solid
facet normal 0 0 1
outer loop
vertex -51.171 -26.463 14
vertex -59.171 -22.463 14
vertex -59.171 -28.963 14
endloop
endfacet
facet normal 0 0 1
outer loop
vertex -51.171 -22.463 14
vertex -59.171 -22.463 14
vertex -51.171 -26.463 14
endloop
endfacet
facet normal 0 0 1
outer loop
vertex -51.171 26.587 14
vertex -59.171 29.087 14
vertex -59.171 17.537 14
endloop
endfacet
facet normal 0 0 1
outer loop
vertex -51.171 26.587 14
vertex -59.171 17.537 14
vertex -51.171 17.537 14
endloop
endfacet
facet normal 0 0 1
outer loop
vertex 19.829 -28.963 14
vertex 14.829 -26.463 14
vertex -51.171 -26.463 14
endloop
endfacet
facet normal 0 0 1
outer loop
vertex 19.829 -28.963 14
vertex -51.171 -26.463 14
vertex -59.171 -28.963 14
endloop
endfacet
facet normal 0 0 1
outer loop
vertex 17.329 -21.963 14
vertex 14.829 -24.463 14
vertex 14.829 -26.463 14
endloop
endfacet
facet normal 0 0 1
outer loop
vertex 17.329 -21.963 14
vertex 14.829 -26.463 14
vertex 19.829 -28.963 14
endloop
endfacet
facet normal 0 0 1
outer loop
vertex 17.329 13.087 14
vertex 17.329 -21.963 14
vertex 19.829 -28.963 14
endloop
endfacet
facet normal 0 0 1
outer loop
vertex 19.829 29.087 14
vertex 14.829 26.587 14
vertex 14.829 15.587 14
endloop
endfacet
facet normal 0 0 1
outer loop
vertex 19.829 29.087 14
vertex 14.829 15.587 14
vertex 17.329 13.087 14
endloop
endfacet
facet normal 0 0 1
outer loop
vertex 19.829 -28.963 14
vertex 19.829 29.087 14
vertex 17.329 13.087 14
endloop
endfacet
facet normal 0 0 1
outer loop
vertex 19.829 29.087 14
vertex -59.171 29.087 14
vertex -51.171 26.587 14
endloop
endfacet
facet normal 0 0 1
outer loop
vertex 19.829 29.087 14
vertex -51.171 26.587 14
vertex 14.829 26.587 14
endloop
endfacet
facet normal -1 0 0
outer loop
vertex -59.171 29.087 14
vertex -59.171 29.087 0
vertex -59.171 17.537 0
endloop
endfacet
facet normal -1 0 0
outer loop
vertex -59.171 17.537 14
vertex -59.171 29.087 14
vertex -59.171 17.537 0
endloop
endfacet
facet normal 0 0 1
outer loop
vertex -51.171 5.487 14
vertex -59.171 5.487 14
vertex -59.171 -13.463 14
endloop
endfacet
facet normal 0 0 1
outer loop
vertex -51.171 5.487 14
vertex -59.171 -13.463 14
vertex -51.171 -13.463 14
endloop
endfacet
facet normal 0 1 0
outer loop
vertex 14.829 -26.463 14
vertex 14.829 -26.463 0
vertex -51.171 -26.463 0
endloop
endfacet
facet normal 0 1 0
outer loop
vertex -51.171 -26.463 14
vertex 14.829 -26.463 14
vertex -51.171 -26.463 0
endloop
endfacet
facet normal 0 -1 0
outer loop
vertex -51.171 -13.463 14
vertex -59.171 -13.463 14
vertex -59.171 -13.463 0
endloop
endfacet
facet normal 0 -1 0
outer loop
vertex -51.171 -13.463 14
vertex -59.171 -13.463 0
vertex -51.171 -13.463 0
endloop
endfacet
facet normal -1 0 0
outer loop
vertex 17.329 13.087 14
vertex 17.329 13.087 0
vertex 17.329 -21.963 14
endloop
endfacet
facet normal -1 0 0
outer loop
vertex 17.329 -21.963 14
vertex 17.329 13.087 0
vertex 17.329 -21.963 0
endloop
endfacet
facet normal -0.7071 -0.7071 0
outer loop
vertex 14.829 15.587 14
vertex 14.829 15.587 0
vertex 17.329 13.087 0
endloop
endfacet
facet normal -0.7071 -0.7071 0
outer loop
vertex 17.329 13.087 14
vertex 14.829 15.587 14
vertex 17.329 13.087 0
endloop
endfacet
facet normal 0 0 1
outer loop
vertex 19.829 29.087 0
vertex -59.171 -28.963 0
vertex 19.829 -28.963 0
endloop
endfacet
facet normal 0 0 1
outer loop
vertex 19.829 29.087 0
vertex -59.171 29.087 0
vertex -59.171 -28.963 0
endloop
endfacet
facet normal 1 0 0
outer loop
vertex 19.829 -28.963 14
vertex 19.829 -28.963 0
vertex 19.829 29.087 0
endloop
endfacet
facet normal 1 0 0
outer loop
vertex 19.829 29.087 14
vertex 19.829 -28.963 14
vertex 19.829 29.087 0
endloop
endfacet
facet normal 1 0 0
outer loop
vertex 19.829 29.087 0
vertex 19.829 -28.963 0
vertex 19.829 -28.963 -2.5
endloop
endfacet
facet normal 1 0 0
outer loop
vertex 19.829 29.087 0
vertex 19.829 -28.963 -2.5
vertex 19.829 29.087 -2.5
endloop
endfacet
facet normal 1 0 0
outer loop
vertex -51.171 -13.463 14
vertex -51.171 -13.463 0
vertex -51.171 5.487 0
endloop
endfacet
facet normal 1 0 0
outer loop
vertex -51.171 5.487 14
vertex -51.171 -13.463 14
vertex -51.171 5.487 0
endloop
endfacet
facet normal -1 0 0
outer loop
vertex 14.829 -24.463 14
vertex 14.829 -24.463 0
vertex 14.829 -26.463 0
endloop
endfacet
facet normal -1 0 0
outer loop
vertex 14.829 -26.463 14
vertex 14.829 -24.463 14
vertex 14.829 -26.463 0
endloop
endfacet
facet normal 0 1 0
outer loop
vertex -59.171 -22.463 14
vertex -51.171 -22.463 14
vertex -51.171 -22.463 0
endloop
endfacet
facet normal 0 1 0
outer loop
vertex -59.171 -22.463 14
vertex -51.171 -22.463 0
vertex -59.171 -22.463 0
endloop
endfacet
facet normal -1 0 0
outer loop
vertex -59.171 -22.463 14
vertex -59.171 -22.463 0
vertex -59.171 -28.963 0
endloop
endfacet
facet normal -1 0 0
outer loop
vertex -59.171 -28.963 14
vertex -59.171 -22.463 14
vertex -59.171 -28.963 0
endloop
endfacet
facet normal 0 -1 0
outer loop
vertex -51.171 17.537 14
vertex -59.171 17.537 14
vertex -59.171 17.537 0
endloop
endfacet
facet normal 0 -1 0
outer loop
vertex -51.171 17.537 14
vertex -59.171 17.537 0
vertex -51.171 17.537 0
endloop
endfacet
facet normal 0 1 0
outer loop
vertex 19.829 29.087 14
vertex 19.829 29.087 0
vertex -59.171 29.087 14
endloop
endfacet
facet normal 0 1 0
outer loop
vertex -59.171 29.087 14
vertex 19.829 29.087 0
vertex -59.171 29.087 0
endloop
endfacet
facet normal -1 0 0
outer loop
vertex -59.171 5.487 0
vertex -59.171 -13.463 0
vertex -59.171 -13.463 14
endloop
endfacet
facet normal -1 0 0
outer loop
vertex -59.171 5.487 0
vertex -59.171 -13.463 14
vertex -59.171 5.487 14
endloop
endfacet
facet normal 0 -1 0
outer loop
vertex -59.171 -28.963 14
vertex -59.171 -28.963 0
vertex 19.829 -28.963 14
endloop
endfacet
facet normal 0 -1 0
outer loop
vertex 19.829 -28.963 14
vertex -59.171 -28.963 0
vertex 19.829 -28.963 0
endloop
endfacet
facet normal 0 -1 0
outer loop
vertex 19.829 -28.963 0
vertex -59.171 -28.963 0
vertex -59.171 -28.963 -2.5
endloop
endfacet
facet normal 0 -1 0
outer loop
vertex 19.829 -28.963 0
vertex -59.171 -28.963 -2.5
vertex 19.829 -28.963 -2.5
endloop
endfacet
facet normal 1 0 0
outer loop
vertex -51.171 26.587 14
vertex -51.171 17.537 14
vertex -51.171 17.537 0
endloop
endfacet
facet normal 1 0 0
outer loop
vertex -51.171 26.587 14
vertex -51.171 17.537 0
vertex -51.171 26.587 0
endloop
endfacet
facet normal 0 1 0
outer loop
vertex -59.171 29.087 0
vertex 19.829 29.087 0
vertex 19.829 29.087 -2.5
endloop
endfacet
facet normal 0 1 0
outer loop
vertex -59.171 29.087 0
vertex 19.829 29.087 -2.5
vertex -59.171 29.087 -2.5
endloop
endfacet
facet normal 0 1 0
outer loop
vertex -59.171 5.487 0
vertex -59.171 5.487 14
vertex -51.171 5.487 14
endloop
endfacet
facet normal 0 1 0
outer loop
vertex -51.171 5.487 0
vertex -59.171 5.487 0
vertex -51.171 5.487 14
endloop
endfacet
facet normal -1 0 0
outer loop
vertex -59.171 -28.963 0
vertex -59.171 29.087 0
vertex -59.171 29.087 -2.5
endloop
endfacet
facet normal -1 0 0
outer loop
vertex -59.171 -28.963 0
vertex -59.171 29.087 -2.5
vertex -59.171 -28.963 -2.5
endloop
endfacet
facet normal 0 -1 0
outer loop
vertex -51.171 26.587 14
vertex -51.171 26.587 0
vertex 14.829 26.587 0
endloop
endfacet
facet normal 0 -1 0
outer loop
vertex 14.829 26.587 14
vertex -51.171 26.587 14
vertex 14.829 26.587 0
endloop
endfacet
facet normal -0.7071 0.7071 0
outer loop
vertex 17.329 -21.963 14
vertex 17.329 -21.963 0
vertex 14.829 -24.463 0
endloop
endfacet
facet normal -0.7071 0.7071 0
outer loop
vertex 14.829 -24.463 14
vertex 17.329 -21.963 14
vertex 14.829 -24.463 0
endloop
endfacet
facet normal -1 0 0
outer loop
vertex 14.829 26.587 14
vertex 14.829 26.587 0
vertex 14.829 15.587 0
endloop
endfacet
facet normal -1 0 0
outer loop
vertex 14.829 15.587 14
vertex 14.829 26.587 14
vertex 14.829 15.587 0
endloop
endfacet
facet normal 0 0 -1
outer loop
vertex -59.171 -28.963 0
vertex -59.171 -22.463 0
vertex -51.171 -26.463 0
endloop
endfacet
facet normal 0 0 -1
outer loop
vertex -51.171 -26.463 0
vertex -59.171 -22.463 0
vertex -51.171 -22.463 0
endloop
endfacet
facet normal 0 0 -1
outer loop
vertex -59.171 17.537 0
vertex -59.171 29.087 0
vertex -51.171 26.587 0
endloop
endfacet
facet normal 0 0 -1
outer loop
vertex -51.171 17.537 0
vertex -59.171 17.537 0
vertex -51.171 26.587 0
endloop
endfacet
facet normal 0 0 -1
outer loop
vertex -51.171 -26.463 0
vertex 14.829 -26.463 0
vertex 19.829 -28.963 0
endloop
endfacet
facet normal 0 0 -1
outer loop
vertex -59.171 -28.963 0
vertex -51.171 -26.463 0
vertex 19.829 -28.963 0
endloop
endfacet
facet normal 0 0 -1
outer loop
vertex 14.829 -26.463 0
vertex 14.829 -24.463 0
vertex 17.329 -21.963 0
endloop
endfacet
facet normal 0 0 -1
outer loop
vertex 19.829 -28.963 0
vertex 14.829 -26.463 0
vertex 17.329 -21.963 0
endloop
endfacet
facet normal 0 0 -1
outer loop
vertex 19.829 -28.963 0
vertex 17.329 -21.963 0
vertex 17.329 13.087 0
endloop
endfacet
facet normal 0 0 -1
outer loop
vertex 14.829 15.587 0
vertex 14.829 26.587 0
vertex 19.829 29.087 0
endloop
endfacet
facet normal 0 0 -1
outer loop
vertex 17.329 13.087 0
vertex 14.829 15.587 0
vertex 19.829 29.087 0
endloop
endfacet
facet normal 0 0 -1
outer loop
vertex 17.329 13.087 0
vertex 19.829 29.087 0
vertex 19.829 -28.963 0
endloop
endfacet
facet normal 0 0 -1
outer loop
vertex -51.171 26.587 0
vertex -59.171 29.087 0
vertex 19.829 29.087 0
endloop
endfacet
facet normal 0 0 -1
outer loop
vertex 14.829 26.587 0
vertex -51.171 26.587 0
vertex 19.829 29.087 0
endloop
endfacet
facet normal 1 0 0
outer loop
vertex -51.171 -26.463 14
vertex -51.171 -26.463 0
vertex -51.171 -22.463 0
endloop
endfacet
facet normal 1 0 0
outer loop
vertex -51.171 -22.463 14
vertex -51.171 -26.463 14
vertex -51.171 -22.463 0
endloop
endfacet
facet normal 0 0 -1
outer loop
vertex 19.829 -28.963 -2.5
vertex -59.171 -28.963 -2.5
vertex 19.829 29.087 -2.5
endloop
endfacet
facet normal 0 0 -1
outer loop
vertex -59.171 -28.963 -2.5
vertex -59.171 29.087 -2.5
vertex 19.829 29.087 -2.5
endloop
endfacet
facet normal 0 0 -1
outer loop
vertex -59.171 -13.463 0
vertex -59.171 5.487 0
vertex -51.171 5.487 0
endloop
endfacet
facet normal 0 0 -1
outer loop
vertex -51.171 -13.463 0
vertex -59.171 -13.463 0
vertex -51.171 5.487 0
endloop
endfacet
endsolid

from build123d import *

# Parameters (mm, degrees)
F1_DEPTH = 14
F0_W     = 8
F0_H     = 18.95
F0_H_2   = 9
F0_H_3   = 12.05
F2_DEPTH = 2.5


with BuildPart() as f1:
    # F0 (on Top) → F1 (new body)
    with BuildSketch(Plane.XY):
        Polygon((-51.1712852555, 17.5374228269), (-51.1712852555, 26.5874228269), (14.8287147445, 26.5874228269), (17.3287147445, 26.5874228269), (17.3287147445, 13.0874228269), (17.3287147445, -21.9625771731), (17.3287147445, -26.4625771731), (14.8287147445, -26.4625771731), (-51.1712852555, -26.4625771731), (-51.1712852555, -22.4625771731), (-59.1712852555, -22.4625771731), (-59.1712852555, -28.9625771731), (19.8287147445, -28.9625771731), (19.8287147445, 29.0874228269), (-59.1712852555, 29.0874228269), (-59.1712852555, 17.5374228269), align=None)
        Polygon((17.3287147445, 26.5874228269), (14.8287147445, 26.5874228269), (14.8287147445, 15.5874228269), (17.3287147445, 13.0874228269), align=None)
        Polygon((17.3287147445, -21.9625771731), (14.8287147445, -24.4625771731), (14.8287147445, -26.4625771731), (17.3287147445, -26.4625771731), align=None)
    extrude(amount=F1_DEPTH)


with BuildPart() as f1b:
    # F0 (on Top) → F1, piece 2 (new body)
    with BuildSketch(Plane.XY):
        with Locations((-55.1712852555, -3.9875771731)):
            Rectangle(F0_W, F0_H)
    extrude(amount=F1_DEPTH)


with BuildPart() as f2:
    # F0 (on Top) → F2 (new body)
    with BuildSketch(Plane.XY):
        with BuildLine():
            Line((14.8287147445, 26.5874228269), (-51.1712852555, 26.5874228269))
            Line((-51.1712852555, 26.5874228269), (-51.1712852555, 17.5374228269))
            ThreePointArc((-51.1712852555, 17.5374228269), (-48.6712852555, 20.0374228269), (-46.1712852555, 17.5374228269))
            ThreePointArc((-46.1712852555, 17.5374228269), (-46.9035183025, 15.7696558739), (-48.6712852555, 15.0374228269))
            Line((-48.6712852555, 15.0374228269), (-48.6712852555, 7.9874228269))
            ThreePointArc((-48.6712852555, 7.9874228269), (-46.9035183025, 7.2551897799), (-46.1712852555, 5.4874228269))
            ThreePointArc((-46.1712852555, 5.4874228269), (-48.6712852555, 2.9874228269), (-51.1712852555, 5.4874228269))
            Line((-51.1712852555, 5.4874228269), (-51.1712852555, -13.4625771731))
            Line((-51.1712852555, -13.4625771731), (-51.1712852555, -22.4625771731))
            Line((-51.1712852555, -22.4625771731), (-51.1712852555, -26.4625771731))
            Line((-51.1712852555, -26.4625771731), (14.8287147445, -26.4625771731))
            Line((14.8287147445, -26.4625771731), (14.8287147445, -24.4625771731))
            Line((14.8287147445, -24.4625771731), (14.8287147445, 15.5874228269))
            Line((14.8287147445, 15.5874228269), (14.8287147445, 26.5874228269))
        make_face()
        with Locations((-55.1712852555, -17.9625771731)):
            Rectangle(F0_W, F0_H_2)
        Polygon((-51.1712852555, 17.5374228269), (-51.1712852555, 26.5874228269), (14.8287147445, 26.5874228269), (17.3287147445, 26.5874228269), (17.3287147445, 13.0874228269), (17.3287147445, -21.9625771731), (17.3287147445, -26.4625771731), (14.8287147445, -26.4625771731), (-51.1712852555, -26.4625771731), (-51.1712852555, -22.4625771731), (-59.1712852555, -22.4625771731), (-59.1712852555, -28.9625771731), (19.8287147445, -28.9625771731), (19.8287147445, 29.0874228269), (-59.1712852555, 29.0874228269), (-59.1712852555, 17.5374228269), align=None)
        with Locations((-55.1712852555, -3.9875771731)):
            Rectangle(F0_W, F0_H)
        with Locations((-55.1712852555, 11.5124228269)):
            Rectangle(F0_W, F0_H_3)
        Polygon((17.3287147445, 13.0874228269), (14.8287147445, 15.5874228269), (14.8287147445, -24.4625771731), (17.3287147445, -21.9625771731), align=None)
        Polygon((17.3287147445, -21.9625771731), (14.8287147445, -24.4625771731), (14.8287147445, -26.4625771731), (17.3287147445, -26.4625771731), align=None)
        Polygon((17.3287147445, 26.5874228269), (14.8287147445, 26.5874228269), (14.8287147445, 15.5874228269), (17.3287147445, 13.0874228269), align=None)
        with BuildLine():
            ThreePointArc((-46.1712852555, 17.5374228269), (-48.6712852555, 20.0374228269), (-51.1712852555, 17.5374228269))
            Line((-51.1712852555, 17.5374228269), (-48.6712852555, 17.5374228269))
            Line((-48.6712852555, 17.5374228269), (-48.6712852555, 15.0374228269))
            ThreePointArc((-48.6712852555, 15.0374228269), (-46.9035183025, 15.7696558739), (-46.1712852555, 17.5374228269))
        make_face()
        with BuildLine():
            Line((-48.6712852555, 17.5374228269), (-51.1712852555, 17.5374228269))
            ThreePointArc((-51.1712852555, 17.5374228269), (-50.4390522084, 15.7696558739), (-48.6712852555, 15.0374228269))
            Line((-48.6712852555, 15.0374228269), (-48.6712852555, 17.5374228269))
        make_face()
        with BuildLine():
            ThreePointArc((-48.6712852555, 15.0374228269), (-50.4390522084, 15.7696558739), (-51.1712852555, 17.5374228269))
            Line((-51.1712852555, 17.5374228269), (-51.1712852555, 5.4874228269))
            ThreePointArc((-51.1712852555, 5.4874228269), (-50.4390522084, 7.2551897799), (-48.6712852555, 7.9874228269))
            Line((-48.6712852555, 7.9874228269), (-48.6712852555, 15.0374228269))
        make_face()
        with BuildLine():
            ThreePointArc((-48.6712852555, 7.9874228269), (-50.4390522084, 7.2551897799), (-51.1712852555, 5.4874228269))
            Line((-51.1712852555, 5.4874228269), (-48.6712852555, 5.4874228269))
            Line((-48.6712852555, 5.4874228269), (-48.6712852555, 7.9874228269))
        make_face()
        with BuildLine():
            Line((-48.6712852555, 5.4874228269), (-51.1712852555, 5.4874228269))
            ThreePointArc((-51.1712852555, 5.4874228269), (-48.6712852555, 2.9874228269), (-46.1712852555, 5.4874228269))
            ThreePointArc((-46.1712852555, 5.4874228269), (-46.9035183025, 7.2551897799), (-48.6712852555, 7.9874228269))
            Line((-48.6712852555, 7.9874228269), (-48.6712852555, 5.4874228269))
        make_face()
    extrude(amount=-F2_DEPTH)


solid = Compound([f1.part, f1b.part, f2.part])
